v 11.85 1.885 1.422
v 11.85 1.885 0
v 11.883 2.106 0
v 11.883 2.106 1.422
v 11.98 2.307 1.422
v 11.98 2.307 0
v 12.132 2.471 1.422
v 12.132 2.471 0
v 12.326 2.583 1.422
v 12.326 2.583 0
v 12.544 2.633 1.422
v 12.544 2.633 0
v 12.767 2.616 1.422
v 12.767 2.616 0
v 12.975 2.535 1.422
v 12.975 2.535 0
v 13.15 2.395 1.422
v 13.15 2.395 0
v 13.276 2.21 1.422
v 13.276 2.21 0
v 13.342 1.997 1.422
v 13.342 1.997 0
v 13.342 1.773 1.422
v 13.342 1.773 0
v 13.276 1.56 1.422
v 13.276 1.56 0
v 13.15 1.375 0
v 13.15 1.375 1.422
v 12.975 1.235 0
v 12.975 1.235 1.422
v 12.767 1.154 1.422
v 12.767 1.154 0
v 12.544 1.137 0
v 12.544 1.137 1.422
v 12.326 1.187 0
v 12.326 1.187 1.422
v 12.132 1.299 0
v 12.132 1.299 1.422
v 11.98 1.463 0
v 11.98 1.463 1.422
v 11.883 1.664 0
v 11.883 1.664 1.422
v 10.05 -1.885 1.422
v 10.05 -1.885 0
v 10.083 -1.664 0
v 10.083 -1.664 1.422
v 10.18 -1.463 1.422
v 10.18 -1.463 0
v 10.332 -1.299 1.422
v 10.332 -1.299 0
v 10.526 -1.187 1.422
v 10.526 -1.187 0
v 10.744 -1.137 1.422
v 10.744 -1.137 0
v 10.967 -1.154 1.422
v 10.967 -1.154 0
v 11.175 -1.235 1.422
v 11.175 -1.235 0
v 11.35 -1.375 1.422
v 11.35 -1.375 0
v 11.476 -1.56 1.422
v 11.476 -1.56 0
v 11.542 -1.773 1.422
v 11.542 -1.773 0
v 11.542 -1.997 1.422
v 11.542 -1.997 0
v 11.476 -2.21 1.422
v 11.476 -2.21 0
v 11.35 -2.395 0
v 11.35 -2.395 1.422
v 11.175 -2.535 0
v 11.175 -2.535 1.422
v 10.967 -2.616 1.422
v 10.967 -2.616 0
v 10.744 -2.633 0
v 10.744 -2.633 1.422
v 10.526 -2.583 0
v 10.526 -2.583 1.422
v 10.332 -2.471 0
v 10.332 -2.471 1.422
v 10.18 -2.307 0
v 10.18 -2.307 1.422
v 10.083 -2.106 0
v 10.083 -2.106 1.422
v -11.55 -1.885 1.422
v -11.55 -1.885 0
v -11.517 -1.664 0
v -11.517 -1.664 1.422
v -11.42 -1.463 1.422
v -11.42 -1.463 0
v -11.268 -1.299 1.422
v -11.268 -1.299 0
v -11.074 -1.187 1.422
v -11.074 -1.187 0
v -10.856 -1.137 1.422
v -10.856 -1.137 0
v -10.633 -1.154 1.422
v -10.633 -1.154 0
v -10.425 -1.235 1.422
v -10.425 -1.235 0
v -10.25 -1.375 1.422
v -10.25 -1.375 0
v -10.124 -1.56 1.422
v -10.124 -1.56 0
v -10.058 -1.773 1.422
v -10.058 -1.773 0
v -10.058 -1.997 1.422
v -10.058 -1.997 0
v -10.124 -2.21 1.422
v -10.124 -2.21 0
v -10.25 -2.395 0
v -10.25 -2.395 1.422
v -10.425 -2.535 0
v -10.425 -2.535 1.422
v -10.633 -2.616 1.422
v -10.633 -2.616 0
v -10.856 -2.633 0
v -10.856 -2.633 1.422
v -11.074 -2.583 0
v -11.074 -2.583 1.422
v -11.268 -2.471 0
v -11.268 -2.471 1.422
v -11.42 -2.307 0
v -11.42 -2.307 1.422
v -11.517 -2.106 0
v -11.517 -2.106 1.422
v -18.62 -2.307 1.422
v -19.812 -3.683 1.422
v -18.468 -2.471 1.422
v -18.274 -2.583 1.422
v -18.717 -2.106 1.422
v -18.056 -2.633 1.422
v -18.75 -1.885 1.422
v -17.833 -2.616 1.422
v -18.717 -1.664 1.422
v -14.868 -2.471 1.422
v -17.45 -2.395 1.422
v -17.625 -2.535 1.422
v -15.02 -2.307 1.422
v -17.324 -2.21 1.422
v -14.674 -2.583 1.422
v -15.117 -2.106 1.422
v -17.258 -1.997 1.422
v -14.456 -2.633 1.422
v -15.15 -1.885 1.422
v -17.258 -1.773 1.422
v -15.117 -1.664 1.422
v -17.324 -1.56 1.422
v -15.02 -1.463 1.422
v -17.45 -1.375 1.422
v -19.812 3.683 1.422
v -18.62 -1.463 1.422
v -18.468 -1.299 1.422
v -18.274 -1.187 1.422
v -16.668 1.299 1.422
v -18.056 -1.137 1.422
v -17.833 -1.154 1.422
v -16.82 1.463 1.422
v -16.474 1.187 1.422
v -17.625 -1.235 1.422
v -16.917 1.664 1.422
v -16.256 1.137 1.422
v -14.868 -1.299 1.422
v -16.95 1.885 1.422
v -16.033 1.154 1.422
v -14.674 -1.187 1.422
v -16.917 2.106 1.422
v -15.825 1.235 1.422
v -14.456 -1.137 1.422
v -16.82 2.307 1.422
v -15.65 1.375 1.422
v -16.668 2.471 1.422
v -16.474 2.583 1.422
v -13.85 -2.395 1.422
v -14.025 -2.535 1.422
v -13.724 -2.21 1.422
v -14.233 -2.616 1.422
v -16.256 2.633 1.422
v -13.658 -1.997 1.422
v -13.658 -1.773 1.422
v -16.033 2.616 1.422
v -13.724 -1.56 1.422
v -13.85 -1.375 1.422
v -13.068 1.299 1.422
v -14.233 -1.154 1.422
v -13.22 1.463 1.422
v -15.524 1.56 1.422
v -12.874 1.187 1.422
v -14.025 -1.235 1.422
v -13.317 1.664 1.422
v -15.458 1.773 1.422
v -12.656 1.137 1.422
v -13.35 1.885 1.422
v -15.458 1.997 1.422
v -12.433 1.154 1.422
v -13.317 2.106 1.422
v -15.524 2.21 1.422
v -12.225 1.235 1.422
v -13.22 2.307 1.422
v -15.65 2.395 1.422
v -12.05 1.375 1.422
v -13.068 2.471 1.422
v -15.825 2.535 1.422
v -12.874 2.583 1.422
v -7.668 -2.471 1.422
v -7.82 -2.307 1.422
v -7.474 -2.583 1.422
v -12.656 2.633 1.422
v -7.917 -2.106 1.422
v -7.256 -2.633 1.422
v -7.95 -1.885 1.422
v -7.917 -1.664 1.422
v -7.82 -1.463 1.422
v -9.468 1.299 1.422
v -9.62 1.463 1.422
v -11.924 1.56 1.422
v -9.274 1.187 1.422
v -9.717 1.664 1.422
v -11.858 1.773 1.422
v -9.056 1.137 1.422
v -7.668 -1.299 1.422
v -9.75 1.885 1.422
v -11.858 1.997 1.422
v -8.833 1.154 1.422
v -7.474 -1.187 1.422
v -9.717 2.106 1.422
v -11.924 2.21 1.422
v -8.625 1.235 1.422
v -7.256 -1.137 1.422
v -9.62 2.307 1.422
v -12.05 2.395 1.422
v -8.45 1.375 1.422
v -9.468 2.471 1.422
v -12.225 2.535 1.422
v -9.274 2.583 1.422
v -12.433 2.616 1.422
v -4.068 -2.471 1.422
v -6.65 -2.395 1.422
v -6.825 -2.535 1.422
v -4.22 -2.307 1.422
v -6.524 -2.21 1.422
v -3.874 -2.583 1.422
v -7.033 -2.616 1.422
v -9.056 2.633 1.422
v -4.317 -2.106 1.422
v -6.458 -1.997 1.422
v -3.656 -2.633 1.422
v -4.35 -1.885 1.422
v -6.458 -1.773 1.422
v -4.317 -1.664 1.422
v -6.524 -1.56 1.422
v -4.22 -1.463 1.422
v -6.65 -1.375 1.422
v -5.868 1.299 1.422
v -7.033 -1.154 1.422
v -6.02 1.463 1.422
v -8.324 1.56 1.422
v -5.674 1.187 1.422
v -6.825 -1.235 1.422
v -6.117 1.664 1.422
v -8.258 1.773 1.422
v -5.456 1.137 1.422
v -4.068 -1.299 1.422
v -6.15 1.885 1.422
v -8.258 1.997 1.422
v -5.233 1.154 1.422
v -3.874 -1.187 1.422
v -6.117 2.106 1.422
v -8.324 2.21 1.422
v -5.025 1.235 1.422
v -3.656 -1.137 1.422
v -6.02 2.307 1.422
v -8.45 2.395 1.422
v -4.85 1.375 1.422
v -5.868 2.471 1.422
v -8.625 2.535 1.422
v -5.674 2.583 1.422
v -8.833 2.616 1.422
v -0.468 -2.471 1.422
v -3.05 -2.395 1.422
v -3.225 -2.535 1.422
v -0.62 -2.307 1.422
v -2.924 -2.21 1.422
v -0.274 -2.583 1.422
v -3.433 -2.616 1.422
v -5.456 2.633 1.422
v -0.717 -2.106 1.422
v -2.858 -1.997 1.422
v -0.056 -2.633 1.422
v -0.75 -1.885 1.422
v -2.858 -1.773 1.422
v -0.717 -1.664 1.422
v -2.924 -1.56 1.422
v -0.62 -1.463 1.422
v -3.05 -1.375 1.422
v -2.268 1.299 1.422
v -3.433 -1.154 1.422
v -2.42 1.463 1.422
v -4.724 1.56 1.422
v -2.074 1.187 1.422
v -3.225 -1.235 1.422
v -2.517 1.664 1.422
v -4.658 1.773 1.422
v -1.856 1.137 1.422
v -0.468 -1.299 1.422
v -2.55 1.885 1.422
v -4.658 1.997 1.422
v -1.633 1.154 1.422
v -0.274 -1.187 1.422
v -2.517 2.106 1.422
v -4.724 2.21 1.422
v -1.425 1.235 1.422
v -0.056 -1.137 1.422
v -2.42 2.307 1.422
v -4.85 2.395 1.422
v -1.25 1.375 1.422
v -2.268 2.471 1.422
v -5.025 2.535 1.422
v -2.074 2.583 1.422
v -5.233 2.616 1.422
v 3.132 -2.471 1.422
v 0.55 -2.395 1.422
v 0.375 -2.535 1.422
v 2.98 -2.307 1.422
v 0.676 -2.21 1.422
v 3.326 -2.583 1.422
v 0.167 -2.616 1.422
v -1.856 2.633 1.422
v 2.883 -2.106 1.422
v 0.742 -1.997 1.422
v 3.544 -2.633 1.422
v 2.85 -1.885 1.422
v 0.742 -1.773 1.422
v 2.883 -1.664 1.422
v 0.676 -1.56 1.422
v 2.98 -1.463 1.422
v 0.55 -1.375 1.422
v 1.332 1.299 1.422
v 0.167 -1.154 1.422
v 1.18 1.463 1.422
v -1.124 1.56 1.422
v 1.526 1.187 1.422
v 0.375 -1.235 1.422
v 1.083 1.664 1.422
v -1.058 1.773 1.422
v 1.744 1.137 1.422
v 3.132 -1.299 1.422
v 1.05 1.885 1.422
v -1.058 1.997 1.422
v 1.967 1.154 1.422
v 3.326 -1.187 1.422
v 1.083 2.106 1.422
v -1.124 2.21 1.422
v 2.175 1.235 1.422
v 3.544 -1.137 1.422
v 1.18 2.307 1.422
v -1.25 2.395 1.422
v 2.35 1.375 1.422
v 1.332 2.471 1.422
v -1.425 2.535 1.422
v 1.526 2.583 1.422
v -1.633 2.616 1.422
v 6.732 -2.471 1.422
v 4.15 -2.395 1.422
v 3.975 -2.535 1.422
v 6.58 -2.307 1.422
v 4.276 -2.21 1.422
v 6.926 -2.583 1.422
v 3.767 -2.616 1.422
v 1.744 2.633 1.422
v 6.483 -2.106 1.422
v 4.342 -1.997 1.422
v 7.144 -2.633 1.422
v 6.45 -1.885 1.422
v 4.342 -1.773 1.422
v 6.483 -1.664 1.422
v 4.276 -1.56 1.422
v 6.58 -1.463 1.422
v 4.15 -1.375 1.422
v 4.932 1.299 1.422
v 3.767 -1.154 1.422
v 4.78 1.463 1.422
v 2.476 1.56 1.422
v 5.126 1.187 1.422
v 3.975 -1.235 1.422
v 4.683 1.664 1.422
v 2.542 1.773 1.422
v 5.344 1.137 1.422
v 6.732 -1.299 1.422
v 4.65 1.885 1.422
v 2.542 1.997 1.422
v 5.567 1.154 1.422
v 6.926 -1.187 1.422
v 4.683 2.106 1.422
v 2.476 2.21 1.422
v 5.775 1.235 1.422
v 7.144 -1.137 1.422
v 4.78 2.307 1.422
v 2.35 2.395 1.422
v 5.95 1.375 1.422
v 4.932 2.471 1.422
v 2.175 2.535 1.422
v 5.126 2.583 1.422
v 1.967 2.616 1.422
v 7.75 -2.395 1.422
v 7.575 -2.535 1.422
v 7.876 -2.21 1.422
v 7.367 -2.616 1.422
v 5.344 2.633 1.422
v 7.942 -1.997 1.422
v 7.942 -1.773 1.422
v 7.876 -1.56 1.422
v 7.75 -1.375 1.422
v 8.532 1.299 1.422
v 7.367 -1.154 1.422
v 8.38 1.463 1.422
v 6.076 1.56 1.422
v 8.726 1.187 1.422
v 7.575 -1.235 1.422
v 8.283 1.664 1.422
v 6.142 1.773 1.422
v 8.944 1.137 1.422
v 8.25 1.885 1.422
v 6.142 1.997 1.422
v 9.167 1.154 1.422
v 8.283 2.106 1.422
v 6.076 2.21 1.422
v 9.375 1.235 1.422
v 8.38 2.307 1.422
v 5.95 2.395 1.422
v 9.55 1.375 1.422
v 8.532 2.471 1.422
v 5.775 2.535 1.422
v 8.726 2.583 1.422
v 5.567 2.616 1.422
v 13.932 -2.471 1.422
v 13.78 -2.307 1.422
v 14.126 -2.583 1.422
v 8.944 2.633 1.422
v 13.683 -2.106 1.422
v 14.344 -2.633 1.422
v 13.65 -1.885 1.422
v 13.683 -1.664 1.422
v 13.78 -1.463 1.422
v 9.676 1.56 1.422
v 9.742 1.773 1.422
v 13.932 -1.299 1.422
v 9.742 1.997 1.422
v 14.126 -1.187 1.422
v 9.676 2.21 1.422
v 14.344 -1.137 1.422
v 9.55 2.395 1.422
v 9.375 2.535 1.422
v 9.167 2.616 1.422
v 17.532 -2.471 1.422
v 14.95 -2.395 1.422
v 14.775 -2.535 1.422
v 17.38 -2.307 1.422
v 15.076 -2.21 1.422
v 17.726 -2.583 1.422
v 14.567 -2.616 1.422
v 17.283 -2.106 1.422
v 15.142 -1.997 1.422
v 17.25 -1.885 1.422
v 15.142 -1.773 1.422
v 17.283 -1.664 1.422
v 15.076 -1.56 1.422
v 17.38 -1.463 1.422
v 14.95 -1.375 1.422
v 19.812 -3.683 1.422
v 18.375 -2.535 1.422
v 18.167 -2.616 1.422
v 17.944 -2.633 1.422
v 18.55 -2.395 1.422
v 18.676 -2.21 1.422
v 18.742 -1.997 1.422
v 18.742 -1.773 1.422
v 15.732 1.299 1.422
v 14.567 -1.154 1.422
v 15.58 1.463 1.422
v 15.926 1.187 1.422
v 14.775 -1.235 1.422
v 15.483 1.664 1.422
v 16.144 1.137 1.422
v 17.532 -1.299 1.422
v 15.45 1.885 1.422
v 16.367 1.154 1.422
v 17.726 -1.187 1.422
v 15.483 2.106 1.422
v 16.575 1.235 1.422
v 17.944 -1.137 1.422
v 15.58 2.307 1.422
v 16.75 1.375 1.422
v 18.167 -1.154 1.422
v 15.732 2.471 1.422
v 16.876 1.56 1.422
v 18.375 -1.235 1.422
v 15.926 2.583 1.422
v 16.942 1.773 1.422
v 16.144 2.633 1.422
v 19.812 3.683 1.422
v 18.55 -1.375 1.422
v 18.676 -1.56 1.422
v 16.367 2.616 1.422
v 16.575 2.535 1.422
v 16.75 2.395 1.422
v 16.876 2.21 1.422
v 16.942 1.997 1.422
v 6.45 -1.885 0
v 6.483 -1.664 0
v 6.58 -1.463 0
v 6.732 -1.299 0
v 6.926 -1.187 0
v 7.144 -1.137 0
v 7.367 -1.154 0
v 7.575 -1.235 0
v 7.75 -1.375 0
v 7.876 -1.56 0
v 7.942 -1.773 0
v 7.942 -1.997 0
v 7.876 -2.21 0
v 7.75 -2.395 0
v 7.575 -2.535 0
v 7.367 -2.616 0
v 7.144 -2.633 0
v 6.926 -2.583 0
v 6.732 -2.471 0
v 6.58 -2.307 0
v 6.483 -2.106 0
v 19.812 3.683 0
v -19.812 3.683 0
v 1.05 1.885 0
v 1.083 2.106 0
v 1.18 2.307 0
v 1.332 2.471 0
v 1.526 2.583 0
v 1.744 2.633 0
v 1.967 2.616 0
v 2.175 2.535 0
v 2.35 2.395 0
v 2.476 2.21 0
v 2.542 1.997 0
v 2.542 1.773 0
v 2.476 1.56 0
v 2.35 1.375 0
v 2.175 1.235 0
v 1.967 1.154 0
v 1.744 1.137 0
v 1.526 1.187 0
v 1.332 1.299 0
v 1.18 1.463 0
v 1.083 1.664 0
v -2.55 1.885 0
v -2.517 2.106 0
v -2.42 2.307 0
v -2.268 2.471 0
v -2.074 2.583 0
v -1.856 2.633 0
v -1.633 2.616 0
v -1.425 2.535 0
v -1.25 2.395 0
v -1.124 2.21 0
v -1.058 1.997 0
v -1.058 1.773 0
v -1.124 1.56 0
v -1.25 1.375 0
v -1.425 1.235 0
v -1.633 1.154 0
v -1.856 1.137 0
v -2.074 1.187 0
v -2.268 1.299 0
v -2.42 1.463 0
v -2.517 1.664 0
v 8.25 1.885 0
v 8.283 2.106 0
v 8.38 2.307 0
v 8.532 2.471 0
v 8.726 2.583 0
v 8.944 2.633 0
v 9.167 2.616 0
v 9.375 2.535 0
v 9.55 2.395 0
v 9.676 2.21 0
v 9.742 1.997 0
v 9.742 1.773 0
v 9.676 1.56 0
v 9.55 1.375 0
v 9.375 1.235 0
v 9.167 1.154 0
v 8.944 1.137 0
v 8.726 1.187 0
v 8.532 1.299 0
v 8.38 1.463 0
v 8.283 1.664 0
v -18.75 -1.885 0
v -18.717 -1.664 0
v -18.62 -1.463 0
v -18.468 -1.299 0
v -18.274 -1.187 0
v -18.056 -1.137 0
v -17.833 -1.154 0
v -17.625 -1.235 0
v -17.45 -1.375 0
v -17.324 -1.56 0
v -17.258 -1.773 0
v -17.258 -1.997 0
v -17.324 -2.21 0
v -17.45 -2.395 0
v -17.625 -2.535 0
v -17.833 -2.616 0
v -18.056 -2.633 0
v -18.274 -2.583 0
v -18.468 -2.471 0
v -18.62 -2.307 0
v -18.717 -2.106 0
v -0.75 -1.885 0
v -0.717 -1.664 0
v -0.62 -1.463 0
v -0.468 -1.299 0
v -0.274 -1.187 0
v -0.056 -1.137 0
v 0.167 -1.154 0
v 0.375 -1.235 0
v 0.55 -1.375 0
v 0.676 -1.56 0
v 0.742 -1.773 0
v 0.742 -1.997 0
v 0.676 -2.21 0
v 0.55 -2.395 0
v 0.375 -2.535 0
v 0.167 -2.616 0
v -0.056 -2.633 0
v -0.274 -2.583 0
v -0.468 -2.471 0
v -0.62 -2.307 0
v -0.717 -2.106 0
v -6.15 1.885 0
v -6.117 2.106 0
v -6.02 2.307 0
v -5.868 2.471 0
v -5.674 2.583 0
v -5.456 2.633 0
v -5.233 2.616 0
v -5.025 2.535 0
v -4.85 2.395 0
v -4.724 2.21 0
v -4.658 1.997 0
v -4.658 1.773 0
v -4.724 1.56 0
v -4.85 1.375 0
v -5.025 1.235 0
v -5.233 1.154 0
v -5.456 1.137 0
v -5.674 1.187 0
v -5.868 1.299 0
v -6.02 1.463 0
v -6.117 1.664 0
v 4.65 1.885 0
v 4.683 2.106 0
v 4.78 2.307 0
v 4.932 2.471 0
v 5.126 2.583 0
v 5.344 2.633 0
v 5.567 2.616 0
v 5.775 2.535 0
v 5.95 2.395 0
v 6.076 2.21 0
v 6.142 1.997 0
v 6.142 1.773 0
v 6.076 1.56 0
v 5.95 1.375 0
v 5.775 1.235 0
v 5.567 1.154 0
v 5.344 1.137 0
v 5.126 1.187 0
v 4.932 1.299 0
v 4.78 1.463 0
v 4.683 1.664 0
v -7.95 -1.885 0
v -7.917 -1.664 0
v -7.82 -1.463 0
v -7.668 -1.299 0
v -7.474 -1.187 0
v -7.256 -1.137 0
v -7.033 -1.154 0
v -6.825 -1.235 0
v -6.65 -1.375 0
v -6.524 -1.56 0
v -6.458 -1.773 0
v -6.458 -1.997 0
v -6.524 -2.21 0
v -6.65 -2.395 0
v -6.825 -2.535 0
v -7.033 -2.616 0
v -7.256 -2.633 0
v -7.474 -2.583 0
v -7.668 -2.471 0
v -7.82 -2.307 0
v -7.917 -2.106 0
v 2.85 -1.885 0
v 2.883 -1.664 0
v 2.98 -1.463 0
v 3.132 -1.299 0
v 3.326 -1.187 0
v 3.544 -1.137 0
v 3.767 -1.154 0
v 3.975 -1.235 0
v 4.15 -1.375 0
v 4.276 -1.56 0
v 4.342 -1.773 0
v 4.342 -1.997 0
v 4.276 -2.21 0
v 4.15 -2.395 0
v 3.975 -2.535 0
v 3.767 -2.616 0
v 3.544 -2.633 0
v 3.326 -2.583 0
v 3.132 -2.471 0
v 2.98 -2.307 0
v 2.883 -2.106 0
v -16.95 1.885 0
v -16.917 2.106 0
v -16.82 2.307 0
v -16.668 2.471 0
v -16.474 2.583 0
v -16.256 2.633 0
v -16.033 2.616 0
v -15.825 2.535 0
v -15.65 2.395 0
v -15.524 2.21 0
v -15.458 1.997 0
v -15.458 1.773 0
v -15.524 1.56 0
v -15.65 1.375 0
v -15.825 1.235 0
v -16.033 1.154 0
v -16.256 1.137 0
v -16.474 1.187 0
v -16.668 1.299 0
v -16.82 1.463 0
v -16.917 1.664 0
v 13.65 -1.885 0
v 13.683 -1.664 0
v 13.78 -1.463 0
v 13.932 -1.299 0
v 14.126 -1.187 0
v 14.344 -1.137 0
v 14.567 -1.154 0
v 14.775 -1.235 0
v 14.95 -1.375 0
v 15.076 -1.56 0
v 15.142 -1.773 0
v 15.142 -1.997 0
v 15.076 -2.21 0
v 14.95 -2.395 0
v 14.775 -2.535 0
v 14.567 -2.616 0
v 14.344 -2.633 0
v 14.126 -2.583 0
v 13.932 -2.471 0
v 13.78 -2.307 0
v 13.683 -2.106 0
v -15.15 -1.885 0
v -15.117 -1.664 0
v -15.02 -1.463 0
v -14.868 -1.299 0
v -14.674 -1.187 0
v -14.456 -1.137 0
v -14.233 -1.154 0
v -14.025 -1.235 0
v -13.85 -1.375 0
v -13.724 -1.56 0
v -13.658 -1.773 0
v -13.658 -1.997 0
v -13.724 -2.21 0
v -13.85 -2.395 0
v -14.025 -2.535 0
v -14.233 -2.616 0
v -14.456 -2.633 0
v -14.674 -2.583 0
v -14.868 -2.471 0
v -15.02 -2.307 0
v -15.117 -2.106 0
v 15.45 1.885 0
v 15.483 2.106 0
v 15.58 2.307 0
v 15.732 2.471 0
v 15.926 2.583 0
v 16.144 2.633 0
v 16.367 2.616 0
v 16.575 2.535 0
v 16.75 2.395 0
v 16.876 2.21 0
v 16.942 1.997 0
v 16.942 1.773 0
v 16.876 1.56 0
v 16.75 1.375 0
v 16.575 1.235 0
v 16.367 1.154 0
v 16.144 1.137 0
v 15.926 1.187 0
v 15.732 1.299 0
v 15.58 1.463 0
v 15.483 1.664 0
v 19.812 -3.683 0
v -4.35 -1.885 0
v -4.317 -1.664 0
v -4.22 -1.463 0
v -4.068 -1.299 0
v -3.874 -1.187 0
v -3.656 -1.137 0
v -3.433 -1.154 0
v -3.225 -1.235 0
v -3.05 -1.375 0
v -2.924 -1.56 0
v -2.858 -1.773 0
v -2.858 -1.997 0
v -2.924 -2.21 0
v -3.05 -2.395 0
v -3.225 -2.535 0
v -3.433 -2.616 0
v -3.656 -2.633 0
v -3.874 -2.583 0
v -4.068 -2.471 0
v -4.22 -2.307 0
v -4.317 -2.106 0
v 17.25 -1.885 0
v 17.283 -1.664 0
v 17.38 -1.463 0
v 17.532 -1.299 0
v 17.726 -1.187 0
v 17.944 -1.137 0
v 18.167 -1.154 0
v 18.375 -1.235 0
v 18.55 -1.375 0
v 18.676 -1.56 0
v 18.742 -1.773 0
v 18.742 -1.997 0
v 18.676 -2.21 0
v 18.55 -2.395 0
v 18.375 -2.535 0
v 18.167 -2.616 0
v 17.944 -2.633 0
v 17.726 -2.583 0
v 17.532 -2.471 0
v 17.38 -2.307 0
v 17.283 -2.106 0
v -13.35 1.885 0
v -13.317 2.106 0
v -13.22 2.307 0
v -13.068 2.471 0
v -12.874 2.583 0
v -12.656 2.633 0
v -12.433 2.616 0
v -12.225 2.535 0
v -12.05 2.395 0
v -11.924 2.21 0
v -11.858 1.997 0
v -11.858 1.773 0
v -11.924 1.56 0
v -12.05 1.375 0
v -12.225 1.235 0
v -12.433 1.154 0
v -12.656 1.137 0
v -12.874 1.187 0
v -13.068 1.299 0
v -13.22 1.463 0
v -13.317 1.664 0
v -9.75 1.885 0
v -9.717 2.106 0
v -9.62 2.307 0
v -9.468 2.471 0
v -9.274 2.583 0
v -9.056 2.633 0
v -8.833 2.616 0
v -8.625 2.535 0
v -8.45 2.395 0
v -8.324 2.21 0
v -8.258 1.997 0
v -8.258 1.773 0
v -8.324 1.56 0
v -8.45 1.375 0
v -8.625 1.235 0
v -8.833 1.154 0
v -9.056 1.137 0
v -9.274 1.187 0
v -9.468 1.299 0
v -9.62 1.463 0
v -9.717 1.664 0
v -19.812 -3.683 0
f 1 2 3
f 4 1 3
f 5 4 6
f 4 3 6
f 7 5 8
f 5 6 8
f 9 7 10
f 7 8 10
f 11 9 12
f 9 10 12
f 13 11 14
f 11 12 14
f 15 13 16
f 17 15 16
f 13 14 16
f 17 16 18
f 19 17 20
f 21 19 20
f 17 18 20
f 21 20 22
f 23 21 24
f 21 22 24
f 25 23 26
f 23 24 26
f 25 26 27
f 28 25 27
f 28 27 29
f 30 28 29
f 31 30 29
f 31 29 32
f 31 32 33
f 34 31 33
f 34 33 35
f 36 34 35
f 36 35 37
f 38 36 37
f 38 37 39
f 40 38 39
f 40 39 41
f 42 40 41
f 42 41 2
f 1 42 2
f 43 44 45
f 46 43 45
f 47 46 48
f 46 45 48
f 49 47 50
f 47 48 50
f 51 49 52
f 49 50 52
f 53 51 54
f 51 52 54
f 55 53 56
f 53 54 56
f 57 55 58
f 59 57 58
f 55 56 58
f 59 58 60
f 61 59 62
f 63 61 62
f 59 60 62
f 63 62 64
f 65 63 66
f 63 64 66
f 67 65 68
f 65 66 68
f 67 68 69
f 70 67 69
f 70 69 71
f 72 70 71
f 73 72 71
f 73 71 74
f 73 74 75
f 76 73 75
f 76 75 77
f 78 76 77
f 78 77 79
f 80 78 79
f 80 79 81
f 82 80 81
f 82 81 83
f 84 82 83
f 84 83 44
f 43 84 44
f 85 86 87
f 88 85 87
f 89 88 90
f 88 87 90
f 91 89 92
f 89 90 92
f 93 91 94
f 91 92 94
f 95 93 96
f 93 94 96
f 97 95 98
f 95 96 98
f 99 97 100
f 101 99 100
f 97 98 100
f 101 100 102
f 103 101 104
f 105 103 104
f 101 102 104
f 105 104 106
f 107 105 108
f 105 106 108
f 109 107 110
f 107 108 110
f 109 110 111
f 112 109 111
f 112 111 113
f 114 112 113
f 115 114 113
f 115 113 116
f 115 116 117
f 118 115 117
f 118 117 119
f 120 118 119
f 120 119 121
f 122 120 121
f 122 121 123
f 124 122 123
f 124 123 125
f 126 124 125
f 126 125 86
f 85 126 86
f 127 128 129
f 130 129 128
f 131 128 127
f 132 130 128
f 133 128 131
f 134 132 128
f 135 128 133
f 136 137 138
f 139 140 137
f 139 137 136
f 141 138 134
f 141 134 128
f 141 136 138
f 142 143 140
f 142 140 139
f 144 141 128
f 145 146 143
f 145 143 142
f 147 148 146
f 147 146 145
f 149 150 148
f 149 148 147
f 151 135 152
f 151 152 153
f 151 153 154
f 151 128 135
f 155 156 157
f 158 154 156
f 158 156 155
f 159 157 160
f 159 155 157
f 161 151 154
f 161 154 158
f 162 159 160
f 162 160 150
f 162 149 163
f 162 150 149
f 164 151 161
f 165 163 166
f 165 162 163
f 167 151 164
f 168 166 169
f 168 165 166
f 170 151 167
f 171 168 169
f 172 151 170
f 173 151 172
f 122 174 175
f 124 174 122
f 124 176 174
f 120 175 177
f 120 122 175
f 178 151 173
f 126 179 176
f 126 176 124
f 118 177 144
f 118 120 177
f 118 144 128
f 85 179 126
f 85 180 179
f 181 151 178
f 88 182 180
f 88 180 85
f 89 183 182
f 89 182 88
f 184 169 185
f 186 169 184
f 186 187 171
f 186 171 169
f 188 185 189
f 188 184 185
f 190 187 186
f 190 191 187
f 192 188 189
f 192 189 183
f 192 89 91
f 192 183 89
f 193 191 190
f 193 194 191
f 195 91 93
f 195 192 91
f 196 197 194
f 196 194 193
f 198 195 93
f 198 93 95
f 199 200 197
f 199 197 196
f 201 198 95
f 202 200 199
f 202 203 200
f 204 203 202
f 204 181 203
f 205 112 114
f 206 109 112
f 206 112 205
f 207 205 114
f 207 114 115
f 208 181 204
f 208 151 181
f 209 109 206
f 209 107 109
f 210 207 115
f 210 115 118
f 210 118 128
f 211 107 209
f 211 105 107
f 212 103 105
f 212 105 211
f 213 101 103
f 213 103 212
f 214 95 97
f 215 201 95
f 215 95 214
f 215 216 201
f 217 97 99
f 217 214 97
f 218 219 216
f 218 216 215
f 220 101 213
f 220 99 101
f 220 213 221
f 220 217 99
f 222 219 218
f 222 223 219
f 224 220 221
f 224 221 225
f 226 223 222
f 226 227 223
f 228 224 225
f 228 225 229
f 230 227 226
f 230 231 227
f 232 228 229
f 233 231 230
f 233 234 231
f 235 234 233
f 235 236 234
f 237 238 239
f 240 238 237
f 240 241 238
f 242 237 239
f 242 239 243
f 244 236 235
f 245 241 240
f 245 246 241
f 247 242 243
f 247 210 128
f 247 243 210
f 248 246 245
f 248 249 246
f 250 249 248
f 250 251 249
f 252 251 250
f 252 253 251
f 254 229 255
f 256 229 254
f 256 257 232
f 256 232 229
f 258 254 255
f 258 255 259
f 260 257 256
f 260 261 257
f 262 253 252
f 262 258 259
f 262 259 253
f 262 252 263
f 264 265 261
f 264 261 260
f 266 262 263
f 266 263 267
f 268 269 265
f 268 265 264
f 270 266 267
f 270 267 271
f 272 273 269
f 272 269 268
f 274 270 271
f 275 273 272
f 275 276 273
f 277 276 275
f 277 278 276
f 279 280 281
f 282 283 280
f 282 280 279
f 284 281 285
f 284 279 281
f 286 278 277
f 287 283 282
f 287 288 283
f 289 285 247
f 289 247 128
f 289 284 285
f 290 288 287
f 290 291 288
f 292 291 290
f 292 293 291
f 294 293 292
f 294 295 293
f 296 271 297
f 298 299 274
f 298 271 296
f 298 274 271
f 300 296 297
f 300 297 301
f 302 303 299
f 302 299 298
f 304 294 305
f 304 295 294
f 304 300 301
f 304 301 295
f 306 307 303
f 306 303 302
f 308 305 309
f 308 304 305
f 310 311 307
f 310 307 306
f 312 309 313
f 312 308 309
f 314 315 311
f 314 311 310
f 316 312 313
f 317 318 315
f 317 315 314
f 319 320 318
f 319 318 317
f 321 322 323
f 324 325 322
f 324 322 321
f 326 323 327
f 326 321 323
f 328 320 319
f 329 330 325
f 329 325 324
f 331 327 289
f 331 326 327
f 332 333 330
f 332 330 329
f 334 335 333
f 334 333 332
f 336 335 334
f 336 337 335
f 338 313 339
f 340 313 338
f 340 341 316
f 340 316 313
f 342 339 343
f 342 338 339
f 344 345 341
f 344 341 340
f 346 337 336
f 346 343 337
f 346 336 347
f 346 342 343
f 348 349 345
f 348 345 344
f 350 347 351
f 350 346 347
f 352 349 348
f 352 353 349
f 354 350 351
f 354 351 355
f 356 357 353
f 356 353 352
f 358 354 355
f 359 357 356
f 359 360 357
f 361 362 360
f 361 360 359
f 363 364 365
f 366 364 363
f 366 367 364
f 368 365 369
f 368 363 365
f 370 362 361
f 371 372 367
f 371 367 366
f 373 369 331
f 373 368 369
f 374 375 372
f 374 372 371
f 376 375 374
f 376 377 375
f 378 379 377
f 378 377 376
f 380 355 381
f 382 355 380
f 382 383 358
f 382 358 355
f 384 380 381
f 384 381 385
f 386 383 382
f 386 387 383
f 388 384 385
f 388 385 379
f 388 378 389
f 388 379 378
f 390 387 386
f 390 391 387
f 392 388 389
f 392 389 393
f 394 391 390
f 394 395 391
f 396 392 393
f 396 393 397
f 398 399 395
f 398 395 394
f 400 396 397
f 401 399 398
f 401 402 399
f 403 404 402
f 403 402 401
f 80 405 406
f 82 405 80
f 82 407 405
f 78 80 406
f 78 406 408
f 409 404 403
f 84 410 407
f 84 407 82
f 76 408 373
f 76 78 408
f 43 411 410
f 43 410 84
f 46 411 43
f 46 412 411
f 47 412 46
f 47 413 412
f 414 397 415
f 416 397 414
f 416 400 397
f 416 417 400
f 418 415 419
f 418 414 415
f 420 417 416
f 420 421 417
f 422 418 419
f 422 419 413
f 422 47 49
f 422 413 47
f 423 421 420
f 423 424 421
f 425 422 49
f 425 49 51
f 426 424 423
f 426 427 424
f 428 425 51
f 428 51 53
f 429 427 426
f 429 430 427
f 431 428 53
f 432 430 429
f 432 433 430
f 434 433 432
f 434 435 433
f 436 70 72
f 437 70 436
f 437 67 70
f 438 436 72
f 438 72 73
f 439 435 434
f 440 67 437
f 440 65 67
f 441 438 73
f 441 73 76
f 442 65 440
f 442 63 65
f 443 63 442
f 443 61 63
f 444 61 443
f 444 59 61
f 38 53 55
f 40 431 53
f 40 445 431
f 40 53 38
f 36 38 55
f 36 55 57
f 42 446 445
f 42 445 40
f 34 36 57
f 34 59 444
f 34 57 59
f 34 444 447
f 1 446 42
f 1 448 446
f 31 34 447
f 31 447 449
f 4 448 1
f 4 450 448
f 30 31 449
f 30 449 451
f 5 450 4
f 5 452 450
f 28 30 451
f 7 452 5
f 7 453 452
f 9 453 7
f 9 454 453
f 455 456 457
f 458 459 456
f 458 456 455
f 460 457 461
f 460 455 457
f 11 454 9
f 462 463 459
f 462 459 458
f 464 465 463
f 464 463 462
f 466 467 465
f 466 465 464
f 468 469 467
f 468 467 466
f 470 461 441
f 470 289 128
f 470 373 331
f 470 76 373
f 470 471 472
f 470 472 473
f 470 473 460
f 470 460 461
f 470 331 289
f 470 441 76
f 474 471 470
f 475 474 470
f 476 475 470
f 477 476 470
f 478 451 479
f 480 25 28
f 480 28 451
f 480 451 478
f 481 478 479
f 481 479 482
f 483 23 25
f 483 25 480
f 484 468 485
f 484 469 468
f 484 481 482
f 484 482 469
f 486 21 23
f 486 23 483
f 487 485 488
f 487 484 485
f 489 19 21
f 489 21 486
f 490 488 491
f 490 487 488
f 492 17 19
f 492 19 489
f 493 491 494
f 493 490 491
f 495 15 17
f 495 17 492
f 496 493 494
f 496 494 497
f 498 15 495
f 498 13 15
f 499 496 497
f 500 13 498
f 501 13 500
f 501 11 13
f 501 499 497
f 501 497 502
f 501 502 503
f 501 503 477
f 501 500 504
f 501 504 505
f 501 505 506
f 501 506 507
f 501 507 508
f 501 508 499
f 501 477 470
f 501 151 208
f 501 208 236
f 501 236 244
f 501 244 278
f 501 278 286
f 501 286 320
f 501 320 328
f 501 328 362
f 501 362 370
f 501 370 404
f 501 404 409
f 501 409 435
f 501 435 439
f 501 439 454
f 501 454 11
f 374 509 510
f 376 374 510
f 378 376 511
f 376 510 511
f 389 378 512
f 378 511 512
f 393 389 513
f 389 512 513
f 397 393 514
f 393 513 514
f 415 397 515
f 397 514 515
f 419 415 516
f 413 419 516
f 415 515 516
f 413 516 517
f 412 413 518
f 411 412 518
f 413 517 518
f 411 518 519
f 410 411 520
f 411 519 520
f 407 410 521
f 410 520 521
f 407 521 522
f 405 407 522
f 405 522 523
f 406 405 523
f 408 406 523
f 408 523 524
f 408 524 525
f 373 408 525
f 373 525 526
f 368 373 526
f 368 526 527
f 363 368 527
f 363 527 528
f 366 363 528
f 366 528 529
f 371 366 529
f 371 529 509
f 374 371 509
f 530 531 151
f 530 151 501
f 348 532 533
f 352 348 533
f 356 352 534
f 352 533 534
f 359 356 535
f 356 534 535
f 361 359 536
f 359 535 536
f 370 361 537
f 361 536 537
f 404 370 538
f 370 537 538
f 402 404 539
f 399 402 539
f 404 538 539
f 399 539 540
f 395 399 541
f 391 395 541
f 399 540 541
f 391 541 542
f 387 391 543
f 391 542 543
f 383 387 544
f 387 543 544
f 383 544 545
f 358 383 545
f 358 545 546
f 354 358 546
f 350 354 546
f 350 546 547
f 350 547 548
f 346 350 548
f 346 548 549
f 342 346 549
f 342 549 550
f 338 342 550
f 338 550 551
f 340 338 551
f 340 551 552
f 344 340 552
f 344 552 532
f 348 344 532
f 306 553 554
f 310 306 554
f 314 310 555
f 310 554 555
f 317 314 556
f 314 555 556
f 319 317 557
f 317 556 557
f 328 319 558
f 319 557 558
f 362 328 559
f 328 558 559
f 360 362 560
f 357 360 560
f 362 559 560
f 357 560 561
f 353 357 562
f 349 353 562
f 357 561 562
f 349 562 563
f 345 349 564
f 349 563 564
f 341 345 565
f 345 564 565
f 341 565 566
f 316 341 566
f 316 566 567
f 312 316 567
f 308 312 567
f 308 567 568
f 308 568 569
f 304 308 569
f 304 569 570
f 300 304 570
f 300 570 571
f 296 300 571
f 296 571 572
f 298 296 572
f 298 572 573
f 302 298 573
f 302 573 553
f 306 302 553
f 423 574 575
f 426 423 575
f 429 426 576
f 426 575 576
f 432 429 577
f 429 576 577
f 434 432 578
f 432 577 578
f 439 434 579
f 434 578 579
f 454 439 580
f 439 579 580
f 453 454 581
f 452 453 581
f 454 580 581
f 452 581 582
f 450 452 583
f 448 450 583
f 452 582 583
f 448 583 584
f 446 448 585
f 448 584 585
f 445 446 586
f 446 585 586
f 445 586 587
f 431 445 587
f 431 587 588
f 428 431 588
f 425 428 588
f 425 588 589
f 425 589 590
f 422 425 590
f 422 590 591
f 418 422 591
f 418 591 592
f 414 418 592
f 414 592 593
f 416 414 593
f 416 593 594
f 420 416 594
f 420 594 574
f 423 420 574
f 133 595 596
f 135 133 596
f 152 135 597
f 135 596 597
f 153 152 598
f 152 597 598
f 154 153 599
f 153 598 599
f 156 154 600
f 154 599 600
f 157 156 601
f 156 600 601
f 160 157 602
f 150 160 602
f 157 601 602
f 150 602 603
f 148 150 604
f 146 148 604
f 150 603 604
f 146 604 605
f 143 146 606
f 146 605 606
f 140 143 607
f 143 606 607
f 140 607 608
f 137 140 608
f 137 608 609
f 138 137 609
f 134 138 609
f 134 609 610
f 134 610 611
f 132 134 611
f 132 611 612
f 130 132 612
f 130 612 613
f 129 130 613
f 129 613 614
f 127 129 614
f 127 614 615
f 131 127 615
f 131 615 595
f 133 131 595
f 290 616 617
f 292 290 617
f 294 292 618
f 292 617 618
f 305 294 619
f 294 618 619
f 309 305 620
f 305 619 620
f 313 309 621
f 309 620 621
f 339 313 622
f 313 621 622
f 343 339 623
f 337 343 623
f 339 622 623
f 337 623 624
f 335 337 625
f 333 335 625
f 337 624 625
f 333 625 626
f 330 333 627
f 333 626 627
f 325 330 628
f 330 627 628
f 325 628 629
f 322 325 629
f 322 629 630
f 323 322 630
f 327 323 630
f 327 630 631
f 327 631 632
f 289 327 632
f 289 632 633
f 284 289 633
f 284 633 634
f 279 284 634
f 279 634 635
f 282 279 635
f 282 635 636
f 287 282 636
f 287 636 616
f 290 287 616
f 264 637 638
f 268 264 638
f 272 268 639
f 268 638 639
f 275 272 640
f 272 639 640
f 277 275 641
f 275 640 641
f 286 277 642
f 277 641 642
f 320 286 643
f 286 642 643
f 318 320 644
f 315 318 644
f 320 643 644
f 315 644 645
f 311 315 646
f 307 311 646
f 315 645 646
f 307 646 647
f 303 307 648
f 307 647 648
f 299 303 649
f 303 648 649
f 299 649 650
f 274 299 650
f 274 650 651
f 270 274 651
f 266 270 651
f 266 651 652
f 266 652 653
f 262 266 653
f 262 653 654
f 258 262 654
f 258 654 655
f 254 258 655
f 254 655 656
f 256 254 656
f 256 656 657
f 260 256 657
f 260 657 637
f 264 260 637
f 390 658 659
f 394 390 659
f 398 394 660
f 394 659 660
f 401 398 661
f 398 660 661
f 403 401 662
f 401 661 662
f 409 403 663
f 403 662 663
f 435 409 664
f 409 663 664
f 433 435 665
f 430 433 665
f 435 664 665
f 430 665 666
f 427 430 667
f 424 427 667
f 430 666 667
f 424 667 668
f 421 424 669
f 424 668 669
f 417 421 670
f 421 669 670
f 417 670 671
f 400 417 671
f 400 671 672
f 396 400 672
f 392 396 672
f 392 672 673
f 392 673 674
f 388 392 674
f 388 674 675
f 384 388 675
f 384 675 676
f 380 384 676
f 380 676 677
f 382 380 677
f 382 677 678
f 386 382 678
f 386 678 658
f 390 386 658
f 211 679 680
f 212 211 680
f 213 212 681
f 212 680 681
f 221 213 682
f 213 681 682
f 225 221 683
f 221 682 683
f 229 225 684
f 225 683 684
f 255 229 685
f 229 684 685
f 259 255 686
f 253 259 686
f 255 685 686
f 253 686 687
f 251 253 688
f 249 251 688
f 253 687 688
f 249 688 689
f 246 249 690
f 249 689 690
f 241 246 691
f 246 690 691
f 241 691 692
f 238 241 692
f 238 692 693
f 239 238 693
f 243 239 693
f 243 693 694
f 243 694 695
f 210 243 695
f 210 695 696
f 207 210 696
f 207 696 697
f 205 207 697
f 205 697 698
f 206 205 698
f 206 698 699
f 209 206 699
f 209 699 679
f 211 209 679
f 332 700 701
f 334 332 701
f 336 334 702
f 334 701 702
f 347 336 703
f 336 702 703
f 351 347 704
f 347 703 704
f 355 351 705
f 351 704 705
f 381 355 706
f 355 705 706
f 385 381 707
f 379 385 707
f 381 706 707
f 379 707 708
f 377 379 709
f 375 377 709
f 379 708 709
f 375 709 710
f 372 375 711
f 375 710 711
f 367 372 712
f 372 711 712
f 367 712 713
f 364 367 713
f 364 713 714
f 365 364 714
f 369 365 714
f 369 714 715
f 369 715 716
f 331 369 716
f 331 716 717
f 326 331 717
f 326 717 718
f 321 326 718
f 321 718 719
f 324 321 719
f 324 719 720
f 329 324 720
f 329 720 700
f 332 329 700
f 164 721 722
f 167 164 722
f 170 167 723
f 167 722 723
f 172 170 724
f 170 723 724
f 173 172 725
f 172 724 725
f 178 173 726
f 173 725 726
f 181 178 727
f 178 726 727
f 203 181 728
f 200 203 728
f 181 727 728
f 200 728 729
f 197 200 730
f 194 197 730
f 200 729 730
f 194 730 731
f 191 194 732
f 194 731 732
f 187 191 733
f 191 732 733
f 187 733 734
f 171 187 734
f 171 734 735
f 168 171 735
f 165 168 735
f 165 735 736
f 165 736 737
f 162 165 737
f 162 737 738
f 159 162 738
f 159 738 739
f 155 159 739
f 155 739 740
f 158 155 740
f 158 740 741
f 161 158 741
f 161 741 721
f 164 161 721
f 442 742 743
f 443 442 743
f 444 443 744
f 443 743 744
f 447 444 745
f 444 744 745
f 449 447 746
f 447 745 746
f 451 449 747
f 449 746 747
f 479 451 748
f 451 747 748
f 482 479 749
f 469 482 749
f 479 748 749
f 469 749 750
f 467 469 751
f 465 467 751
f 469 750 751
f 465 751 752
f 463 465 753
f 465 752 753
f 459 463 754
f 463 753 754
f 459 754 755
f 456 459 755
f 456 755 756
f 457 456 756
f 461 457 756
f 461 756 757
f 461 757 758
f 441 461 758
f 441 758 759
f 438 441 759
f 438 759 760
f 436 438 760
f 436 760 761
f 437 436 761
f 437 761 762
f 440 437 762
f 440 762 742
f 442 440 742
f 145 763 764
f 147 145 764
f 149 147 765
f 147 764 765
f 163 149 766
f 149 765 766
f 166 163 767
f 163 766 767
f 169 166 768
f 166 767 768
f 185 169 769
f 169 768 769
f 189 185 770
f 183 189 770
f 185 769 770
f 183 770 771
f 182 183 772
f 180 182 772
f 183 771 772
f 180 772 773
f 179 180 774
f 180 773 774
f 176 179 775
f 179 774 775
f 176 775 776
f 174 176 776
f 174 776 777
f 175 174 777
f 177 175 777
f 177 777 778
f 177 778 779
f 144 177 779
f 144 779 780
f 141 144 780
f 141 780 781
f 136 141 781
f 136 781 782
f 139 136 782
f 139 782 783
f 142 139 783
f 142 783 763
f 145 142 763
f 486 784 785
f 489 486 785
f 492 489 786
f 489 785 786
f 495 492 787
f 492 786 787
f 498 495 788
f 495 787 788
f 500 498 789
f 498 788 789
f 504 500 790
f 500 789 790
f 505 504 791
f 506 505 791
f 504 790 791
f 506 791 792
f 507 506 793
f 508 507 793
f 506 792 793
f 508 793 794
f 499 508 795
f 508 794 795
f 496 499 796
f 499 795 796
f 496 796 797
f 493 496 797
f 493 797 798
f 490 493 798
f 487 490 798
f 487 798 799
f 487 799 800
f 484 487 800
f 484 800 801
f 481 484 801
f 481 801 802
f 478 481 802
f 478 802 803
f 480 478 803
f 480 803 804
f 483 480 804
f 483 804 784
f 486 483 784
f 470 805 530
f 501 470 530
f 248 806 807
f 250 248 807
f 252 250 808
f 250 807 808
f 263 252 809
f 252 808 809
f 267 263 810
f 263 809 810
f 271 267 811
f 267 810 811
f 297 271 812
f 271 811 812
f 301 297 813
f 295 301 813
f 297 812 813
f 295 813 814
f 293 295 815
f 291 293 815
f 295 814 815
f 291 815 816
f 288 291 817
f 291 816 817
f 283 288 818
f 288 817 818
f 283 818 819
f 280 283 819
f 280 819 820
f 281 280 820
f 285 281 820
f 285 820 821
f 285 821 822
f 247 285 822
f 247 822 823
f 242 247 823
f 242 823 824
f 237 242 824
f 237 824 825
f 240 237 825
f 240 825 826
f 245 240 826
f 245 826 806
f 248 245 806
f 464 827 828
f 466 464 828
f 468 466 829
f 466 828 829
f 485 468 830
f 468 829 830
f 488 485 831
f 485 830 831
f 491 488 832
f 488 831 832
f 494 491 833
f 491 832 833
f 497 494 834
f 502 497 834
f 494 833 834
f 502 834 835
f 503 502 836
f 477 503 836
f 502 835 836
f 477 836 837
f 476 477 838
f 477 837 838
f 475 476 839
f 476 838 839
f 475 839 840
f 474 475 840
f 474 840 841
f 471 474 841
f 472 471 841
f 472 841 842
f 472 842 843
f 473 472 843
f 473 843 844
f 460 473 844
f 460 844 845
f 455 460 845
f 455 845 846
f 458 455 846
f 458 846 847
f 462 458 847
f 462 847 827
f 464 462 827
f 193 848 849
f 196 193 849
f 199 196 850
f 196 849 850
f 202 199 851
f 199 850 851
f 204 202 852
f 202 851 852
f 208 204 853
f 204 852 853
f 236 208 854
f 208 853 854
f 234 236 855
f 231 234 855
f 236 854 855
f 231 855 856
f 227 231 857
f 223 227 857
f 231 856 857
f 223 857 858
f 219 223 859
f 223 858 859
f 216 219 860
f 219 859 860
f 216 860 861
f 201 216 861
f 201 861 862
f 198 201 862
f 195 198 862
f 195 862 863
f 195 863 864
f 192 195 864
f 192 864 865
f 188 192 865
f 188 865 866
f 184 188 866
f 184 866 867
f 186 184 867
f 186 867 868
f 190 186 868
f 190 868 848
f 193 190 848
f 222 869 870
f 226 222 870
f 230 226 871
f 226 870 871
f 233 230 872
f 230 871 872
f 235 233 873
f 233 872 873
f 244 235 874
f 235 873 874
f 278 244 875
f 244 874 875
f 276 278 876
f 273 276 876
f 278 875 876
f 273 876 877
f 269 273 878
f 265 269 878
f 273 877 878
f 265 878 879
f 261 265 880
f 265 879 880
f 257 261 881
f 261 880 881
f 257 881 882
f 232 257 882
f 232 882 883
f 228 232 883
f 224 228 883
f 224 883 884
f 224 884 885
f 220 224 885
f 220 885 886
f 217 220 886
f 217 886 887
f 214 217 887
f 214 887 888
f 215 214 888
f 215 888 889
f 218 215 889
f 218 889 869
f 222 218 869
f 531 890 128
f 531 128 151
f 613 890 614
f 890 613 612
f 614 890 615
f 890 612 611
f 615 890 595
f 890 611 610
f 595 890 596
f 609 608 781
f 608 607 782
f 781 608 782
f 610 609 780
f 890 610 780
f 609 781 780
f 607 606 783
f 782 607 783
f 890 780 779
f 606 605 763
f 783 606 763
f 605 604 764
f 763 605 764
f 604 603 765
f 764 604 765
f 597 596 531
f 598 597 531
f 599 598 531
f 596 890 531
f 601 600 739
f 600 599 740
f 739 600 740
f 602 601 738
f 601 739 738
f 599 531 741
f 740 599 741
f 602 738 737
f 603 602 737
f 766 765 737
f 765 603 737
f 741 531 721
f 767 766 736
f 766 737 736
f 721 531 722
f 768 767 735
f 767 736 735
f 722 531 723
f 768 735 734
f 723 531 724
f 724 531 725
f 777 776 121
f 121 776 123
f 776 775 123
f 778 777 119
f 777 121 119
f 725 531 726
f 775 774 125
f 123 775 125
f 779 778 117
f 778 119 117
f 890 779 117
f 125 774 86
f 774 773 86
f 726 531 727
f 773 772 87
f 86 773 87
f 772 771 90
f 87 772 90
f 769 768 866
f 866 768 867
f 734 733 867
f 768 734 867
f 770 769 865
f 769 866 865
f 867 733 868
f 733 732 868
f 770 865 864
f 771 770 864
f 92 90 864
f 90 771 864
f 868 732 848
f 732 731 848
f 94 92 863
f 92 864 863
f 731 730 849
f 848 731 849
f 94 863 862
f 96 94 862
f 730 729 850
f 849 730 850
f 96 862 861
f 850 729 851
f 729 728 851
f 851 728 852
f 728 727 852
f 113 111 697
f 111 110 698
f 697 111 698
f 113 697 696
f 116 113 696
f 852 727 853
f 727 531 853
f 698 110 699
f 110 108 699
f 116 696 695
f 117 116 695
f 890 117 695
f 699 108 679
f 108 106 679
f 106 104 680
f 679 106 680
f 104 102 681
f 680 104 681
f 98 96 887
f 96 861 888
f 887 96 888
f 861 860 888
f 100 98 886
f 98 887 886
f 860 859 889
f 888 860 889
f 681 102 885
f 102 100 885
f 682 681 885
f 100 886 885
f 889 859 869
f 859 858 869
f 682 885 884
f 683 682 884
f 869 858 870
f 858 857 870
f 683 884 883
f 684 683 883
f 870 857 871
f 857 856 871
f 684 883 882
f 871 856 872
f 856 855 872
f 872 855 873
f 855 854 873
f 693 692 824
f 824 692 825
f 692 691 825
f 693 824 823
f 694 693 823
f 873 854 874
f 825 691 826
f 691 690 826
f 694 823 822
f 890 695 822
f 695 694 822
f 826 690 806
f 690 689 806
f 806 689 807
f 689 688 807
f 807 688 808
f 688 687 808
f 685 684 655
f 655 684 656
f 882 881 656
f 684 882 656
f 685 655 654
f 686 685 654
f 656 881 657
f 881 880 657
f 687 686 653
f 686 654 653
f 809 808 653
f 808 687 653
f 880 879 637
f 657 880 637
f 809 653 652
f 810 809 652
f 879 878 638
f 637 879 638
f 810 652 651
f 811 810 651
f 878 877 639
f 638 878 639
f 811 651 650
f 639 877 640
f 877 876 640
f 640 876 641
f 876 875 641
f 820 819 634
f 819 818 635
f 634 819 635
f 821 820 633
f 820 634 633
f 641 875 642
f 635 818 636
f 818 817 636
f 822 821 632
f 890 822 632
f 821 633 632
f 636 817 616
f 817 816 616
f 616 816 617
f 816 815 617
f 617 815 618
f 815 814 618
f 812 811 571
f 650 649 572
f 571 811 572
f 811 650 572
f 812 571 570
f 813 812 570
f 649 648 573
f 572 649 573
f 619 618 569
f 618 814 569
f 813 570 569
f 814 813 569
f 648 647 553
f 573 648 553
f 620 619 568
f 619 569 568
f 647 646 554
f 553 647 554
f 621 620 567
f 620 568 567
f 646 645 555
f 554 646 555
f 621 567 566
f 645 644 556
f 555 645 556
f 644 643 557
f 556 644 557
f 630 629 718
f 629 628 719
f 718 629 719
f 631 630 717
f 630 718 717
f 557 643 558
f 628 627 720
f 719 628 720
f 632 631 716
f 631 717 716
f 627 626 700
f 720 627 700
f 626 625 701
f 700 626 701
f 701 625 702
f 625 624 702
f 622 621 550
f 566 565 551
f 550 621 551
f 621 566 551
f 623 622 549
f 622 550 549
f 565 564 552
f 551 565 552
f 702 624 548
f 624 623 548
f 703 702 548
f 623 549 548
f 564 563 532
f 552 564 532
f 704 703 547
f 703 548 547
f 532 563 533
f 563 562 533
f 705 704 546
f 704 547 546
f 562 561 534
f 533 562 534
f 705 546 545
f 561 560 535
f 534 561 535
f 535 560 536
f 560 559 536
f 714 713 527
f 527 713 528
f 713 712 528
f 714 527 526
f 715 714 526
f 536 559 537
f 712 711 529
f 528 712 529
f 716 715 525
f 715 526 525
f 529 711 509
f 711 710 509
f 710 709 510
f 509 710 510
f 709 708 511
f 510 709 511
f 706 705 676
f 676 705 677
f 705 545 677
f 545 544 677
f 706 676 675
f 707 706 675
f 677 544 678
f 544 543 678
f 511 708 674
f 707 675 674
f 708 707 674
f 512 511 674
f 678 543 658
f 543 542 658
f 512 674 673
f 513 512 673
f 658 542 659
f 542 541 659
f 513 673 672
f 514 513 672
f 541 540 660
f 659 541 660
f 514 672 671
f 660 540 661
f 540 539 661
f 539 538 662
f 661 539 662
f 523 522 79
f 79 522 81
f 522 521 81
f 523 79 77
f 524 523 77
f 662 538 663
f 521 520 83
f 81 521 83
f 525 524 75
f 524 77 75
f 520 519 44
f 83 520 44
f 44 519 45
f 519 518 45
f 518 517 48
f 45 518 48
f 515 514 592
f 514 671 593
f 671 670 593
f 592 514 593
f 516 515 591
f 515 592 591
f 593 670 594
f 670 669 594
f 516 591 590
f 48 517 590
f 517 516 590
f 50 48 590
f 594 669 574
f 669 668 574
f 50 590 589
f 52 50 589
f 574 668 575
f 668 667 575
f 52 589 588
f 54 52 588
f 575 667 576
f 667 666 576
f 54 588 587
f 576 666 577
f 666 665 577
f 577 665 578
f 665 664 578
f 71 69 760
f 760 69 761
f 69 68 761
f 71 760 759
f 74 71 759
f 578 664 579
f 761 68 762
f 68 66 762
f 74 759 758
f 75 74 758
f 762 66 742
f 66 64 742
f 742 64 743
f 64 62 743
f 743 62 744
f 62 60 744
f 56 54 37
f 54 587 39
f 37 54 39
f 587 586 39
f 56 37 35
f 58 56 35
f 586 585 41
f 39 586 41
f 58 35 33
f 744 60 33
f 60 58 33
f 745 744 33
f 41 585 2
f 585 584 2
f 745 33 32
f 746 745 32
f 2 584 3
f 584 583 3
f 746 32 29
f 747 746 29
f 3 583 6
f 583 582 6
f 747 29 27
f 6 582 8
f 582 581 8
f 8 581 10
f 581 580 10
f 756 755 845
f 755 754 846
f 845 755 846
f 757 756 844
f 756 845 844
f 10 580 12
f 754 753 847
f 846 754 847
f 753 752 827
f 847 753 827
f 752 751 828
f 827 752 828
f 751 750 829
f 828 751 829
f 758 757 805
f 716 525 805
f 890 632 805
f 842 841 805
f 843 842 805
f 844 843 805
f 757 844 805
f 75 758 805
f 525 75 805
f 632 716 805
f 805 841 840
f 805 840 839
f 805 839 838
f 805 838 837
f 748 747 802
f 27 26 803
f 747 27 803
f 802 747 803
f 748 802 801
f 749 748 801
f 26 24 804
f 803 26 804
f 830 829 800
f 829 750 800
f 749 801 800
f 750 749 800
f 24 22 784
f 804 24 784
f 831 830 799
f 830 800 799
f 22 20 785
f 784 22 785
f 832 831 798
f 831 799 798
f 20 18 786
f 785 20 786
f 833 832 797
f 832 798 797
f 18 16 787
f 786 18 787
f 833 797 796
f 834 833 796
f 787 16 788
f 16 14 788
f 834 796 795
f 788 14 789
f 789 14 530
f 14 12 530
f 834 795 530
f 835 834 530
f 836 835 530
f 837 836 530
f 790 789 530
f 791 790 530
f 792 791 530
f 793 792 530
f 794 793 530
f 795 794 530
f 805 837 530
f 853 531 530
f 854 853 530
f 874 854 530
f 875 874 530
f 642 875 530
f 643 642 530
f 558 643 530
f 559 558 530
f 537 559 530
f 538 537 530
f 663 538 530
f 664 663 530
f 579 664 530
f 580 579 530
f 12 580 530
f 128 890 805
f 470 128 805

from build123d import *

# Parameters (mm, degrees)
SKETCH1_W          = 39.624
SKETCH1_H          = 7.366
PEEK_DEPTH         = 1.4224
SKETCH2_R          = 0.75
CUT_EXTRUDE1_DEPTH = 2.4224


with BuildPart() as part:
    # Sketch1 → PEEK (new body)
    with BuildSketch(Plane.XY):
        Rectangle(SKETCH1_W, SKETCH1_H)
    extrude(amount=PEEK_DEPTH)

    # Sketch2 → Cut-Extrude1 (cut, through all)
    with BuildSketch(Plane(origin=(0, 0, 0), x_dir=(-1, 0, 0), z_dir=(0, 0, -1))):
        with Locations((-18, -1.885)):
            Circle(SKETCH2_R)
        with Locations((-14.4, -1.885)):
            Circle(SKETCH2_R)
        with Locations((-10.8, -1.885)):
            Circle(SKETCH2_R)
        with Locations((-7.2, -1.885)):
            Circle(SKETCH2_R)
        with Locations((-3.6, -1.885)):
            Circle(SKETCH2_R)
        with Locations((0, -1.885)):
            Circle(SKETCH2_R)
        with Locations((3.6, -1.885)):
            Circle(SKETCH2_R)
        with Locations((7.2, -1.885)):
            Circle(SKETCH2_R)
        with Locations((10.8, -1.885)):
            Circle(SKETCH2_R)
        with Locations((14.4, -1.885)):
            Circle(SKETCH2_R)
        with Locations((18, -1.885)):
            Circle(SKETCH2_R)
        with Locations((16.2, 1.885)):
            Circle(SKETCH2_R)
        with Locations((12.6, 1.885)):
            Circle(SKETCH2_R)
        with Locations((9, 1.885)):
            Circle(SKETCH2_R)
        with Locations((5.4, 1.885)):
            Circle(SKETCH2_R)
        with Locations((1.8, 1.885)):
            Circle(SKETCH2_R)
        with Locations((-1.8, 1.885)):
            Circle(SKETCH2_R)
        with Locations((-5.4, 1.885)):
            Circle(SKETCH2_R)
        with Locations((-9, 1.885)):
            Circle(SKETCH2_R)
        with Locations((-12.6, 1.885)):
            Circle(SKETCH2_R)
        with Locations((-16.2, 1.885)):
            Circle(SKETCH2_R)
    extrude(amount=-CUT_EXTRUDE1_DEPTH, mode=Mode.SUBTRACT)


solid = part.part
